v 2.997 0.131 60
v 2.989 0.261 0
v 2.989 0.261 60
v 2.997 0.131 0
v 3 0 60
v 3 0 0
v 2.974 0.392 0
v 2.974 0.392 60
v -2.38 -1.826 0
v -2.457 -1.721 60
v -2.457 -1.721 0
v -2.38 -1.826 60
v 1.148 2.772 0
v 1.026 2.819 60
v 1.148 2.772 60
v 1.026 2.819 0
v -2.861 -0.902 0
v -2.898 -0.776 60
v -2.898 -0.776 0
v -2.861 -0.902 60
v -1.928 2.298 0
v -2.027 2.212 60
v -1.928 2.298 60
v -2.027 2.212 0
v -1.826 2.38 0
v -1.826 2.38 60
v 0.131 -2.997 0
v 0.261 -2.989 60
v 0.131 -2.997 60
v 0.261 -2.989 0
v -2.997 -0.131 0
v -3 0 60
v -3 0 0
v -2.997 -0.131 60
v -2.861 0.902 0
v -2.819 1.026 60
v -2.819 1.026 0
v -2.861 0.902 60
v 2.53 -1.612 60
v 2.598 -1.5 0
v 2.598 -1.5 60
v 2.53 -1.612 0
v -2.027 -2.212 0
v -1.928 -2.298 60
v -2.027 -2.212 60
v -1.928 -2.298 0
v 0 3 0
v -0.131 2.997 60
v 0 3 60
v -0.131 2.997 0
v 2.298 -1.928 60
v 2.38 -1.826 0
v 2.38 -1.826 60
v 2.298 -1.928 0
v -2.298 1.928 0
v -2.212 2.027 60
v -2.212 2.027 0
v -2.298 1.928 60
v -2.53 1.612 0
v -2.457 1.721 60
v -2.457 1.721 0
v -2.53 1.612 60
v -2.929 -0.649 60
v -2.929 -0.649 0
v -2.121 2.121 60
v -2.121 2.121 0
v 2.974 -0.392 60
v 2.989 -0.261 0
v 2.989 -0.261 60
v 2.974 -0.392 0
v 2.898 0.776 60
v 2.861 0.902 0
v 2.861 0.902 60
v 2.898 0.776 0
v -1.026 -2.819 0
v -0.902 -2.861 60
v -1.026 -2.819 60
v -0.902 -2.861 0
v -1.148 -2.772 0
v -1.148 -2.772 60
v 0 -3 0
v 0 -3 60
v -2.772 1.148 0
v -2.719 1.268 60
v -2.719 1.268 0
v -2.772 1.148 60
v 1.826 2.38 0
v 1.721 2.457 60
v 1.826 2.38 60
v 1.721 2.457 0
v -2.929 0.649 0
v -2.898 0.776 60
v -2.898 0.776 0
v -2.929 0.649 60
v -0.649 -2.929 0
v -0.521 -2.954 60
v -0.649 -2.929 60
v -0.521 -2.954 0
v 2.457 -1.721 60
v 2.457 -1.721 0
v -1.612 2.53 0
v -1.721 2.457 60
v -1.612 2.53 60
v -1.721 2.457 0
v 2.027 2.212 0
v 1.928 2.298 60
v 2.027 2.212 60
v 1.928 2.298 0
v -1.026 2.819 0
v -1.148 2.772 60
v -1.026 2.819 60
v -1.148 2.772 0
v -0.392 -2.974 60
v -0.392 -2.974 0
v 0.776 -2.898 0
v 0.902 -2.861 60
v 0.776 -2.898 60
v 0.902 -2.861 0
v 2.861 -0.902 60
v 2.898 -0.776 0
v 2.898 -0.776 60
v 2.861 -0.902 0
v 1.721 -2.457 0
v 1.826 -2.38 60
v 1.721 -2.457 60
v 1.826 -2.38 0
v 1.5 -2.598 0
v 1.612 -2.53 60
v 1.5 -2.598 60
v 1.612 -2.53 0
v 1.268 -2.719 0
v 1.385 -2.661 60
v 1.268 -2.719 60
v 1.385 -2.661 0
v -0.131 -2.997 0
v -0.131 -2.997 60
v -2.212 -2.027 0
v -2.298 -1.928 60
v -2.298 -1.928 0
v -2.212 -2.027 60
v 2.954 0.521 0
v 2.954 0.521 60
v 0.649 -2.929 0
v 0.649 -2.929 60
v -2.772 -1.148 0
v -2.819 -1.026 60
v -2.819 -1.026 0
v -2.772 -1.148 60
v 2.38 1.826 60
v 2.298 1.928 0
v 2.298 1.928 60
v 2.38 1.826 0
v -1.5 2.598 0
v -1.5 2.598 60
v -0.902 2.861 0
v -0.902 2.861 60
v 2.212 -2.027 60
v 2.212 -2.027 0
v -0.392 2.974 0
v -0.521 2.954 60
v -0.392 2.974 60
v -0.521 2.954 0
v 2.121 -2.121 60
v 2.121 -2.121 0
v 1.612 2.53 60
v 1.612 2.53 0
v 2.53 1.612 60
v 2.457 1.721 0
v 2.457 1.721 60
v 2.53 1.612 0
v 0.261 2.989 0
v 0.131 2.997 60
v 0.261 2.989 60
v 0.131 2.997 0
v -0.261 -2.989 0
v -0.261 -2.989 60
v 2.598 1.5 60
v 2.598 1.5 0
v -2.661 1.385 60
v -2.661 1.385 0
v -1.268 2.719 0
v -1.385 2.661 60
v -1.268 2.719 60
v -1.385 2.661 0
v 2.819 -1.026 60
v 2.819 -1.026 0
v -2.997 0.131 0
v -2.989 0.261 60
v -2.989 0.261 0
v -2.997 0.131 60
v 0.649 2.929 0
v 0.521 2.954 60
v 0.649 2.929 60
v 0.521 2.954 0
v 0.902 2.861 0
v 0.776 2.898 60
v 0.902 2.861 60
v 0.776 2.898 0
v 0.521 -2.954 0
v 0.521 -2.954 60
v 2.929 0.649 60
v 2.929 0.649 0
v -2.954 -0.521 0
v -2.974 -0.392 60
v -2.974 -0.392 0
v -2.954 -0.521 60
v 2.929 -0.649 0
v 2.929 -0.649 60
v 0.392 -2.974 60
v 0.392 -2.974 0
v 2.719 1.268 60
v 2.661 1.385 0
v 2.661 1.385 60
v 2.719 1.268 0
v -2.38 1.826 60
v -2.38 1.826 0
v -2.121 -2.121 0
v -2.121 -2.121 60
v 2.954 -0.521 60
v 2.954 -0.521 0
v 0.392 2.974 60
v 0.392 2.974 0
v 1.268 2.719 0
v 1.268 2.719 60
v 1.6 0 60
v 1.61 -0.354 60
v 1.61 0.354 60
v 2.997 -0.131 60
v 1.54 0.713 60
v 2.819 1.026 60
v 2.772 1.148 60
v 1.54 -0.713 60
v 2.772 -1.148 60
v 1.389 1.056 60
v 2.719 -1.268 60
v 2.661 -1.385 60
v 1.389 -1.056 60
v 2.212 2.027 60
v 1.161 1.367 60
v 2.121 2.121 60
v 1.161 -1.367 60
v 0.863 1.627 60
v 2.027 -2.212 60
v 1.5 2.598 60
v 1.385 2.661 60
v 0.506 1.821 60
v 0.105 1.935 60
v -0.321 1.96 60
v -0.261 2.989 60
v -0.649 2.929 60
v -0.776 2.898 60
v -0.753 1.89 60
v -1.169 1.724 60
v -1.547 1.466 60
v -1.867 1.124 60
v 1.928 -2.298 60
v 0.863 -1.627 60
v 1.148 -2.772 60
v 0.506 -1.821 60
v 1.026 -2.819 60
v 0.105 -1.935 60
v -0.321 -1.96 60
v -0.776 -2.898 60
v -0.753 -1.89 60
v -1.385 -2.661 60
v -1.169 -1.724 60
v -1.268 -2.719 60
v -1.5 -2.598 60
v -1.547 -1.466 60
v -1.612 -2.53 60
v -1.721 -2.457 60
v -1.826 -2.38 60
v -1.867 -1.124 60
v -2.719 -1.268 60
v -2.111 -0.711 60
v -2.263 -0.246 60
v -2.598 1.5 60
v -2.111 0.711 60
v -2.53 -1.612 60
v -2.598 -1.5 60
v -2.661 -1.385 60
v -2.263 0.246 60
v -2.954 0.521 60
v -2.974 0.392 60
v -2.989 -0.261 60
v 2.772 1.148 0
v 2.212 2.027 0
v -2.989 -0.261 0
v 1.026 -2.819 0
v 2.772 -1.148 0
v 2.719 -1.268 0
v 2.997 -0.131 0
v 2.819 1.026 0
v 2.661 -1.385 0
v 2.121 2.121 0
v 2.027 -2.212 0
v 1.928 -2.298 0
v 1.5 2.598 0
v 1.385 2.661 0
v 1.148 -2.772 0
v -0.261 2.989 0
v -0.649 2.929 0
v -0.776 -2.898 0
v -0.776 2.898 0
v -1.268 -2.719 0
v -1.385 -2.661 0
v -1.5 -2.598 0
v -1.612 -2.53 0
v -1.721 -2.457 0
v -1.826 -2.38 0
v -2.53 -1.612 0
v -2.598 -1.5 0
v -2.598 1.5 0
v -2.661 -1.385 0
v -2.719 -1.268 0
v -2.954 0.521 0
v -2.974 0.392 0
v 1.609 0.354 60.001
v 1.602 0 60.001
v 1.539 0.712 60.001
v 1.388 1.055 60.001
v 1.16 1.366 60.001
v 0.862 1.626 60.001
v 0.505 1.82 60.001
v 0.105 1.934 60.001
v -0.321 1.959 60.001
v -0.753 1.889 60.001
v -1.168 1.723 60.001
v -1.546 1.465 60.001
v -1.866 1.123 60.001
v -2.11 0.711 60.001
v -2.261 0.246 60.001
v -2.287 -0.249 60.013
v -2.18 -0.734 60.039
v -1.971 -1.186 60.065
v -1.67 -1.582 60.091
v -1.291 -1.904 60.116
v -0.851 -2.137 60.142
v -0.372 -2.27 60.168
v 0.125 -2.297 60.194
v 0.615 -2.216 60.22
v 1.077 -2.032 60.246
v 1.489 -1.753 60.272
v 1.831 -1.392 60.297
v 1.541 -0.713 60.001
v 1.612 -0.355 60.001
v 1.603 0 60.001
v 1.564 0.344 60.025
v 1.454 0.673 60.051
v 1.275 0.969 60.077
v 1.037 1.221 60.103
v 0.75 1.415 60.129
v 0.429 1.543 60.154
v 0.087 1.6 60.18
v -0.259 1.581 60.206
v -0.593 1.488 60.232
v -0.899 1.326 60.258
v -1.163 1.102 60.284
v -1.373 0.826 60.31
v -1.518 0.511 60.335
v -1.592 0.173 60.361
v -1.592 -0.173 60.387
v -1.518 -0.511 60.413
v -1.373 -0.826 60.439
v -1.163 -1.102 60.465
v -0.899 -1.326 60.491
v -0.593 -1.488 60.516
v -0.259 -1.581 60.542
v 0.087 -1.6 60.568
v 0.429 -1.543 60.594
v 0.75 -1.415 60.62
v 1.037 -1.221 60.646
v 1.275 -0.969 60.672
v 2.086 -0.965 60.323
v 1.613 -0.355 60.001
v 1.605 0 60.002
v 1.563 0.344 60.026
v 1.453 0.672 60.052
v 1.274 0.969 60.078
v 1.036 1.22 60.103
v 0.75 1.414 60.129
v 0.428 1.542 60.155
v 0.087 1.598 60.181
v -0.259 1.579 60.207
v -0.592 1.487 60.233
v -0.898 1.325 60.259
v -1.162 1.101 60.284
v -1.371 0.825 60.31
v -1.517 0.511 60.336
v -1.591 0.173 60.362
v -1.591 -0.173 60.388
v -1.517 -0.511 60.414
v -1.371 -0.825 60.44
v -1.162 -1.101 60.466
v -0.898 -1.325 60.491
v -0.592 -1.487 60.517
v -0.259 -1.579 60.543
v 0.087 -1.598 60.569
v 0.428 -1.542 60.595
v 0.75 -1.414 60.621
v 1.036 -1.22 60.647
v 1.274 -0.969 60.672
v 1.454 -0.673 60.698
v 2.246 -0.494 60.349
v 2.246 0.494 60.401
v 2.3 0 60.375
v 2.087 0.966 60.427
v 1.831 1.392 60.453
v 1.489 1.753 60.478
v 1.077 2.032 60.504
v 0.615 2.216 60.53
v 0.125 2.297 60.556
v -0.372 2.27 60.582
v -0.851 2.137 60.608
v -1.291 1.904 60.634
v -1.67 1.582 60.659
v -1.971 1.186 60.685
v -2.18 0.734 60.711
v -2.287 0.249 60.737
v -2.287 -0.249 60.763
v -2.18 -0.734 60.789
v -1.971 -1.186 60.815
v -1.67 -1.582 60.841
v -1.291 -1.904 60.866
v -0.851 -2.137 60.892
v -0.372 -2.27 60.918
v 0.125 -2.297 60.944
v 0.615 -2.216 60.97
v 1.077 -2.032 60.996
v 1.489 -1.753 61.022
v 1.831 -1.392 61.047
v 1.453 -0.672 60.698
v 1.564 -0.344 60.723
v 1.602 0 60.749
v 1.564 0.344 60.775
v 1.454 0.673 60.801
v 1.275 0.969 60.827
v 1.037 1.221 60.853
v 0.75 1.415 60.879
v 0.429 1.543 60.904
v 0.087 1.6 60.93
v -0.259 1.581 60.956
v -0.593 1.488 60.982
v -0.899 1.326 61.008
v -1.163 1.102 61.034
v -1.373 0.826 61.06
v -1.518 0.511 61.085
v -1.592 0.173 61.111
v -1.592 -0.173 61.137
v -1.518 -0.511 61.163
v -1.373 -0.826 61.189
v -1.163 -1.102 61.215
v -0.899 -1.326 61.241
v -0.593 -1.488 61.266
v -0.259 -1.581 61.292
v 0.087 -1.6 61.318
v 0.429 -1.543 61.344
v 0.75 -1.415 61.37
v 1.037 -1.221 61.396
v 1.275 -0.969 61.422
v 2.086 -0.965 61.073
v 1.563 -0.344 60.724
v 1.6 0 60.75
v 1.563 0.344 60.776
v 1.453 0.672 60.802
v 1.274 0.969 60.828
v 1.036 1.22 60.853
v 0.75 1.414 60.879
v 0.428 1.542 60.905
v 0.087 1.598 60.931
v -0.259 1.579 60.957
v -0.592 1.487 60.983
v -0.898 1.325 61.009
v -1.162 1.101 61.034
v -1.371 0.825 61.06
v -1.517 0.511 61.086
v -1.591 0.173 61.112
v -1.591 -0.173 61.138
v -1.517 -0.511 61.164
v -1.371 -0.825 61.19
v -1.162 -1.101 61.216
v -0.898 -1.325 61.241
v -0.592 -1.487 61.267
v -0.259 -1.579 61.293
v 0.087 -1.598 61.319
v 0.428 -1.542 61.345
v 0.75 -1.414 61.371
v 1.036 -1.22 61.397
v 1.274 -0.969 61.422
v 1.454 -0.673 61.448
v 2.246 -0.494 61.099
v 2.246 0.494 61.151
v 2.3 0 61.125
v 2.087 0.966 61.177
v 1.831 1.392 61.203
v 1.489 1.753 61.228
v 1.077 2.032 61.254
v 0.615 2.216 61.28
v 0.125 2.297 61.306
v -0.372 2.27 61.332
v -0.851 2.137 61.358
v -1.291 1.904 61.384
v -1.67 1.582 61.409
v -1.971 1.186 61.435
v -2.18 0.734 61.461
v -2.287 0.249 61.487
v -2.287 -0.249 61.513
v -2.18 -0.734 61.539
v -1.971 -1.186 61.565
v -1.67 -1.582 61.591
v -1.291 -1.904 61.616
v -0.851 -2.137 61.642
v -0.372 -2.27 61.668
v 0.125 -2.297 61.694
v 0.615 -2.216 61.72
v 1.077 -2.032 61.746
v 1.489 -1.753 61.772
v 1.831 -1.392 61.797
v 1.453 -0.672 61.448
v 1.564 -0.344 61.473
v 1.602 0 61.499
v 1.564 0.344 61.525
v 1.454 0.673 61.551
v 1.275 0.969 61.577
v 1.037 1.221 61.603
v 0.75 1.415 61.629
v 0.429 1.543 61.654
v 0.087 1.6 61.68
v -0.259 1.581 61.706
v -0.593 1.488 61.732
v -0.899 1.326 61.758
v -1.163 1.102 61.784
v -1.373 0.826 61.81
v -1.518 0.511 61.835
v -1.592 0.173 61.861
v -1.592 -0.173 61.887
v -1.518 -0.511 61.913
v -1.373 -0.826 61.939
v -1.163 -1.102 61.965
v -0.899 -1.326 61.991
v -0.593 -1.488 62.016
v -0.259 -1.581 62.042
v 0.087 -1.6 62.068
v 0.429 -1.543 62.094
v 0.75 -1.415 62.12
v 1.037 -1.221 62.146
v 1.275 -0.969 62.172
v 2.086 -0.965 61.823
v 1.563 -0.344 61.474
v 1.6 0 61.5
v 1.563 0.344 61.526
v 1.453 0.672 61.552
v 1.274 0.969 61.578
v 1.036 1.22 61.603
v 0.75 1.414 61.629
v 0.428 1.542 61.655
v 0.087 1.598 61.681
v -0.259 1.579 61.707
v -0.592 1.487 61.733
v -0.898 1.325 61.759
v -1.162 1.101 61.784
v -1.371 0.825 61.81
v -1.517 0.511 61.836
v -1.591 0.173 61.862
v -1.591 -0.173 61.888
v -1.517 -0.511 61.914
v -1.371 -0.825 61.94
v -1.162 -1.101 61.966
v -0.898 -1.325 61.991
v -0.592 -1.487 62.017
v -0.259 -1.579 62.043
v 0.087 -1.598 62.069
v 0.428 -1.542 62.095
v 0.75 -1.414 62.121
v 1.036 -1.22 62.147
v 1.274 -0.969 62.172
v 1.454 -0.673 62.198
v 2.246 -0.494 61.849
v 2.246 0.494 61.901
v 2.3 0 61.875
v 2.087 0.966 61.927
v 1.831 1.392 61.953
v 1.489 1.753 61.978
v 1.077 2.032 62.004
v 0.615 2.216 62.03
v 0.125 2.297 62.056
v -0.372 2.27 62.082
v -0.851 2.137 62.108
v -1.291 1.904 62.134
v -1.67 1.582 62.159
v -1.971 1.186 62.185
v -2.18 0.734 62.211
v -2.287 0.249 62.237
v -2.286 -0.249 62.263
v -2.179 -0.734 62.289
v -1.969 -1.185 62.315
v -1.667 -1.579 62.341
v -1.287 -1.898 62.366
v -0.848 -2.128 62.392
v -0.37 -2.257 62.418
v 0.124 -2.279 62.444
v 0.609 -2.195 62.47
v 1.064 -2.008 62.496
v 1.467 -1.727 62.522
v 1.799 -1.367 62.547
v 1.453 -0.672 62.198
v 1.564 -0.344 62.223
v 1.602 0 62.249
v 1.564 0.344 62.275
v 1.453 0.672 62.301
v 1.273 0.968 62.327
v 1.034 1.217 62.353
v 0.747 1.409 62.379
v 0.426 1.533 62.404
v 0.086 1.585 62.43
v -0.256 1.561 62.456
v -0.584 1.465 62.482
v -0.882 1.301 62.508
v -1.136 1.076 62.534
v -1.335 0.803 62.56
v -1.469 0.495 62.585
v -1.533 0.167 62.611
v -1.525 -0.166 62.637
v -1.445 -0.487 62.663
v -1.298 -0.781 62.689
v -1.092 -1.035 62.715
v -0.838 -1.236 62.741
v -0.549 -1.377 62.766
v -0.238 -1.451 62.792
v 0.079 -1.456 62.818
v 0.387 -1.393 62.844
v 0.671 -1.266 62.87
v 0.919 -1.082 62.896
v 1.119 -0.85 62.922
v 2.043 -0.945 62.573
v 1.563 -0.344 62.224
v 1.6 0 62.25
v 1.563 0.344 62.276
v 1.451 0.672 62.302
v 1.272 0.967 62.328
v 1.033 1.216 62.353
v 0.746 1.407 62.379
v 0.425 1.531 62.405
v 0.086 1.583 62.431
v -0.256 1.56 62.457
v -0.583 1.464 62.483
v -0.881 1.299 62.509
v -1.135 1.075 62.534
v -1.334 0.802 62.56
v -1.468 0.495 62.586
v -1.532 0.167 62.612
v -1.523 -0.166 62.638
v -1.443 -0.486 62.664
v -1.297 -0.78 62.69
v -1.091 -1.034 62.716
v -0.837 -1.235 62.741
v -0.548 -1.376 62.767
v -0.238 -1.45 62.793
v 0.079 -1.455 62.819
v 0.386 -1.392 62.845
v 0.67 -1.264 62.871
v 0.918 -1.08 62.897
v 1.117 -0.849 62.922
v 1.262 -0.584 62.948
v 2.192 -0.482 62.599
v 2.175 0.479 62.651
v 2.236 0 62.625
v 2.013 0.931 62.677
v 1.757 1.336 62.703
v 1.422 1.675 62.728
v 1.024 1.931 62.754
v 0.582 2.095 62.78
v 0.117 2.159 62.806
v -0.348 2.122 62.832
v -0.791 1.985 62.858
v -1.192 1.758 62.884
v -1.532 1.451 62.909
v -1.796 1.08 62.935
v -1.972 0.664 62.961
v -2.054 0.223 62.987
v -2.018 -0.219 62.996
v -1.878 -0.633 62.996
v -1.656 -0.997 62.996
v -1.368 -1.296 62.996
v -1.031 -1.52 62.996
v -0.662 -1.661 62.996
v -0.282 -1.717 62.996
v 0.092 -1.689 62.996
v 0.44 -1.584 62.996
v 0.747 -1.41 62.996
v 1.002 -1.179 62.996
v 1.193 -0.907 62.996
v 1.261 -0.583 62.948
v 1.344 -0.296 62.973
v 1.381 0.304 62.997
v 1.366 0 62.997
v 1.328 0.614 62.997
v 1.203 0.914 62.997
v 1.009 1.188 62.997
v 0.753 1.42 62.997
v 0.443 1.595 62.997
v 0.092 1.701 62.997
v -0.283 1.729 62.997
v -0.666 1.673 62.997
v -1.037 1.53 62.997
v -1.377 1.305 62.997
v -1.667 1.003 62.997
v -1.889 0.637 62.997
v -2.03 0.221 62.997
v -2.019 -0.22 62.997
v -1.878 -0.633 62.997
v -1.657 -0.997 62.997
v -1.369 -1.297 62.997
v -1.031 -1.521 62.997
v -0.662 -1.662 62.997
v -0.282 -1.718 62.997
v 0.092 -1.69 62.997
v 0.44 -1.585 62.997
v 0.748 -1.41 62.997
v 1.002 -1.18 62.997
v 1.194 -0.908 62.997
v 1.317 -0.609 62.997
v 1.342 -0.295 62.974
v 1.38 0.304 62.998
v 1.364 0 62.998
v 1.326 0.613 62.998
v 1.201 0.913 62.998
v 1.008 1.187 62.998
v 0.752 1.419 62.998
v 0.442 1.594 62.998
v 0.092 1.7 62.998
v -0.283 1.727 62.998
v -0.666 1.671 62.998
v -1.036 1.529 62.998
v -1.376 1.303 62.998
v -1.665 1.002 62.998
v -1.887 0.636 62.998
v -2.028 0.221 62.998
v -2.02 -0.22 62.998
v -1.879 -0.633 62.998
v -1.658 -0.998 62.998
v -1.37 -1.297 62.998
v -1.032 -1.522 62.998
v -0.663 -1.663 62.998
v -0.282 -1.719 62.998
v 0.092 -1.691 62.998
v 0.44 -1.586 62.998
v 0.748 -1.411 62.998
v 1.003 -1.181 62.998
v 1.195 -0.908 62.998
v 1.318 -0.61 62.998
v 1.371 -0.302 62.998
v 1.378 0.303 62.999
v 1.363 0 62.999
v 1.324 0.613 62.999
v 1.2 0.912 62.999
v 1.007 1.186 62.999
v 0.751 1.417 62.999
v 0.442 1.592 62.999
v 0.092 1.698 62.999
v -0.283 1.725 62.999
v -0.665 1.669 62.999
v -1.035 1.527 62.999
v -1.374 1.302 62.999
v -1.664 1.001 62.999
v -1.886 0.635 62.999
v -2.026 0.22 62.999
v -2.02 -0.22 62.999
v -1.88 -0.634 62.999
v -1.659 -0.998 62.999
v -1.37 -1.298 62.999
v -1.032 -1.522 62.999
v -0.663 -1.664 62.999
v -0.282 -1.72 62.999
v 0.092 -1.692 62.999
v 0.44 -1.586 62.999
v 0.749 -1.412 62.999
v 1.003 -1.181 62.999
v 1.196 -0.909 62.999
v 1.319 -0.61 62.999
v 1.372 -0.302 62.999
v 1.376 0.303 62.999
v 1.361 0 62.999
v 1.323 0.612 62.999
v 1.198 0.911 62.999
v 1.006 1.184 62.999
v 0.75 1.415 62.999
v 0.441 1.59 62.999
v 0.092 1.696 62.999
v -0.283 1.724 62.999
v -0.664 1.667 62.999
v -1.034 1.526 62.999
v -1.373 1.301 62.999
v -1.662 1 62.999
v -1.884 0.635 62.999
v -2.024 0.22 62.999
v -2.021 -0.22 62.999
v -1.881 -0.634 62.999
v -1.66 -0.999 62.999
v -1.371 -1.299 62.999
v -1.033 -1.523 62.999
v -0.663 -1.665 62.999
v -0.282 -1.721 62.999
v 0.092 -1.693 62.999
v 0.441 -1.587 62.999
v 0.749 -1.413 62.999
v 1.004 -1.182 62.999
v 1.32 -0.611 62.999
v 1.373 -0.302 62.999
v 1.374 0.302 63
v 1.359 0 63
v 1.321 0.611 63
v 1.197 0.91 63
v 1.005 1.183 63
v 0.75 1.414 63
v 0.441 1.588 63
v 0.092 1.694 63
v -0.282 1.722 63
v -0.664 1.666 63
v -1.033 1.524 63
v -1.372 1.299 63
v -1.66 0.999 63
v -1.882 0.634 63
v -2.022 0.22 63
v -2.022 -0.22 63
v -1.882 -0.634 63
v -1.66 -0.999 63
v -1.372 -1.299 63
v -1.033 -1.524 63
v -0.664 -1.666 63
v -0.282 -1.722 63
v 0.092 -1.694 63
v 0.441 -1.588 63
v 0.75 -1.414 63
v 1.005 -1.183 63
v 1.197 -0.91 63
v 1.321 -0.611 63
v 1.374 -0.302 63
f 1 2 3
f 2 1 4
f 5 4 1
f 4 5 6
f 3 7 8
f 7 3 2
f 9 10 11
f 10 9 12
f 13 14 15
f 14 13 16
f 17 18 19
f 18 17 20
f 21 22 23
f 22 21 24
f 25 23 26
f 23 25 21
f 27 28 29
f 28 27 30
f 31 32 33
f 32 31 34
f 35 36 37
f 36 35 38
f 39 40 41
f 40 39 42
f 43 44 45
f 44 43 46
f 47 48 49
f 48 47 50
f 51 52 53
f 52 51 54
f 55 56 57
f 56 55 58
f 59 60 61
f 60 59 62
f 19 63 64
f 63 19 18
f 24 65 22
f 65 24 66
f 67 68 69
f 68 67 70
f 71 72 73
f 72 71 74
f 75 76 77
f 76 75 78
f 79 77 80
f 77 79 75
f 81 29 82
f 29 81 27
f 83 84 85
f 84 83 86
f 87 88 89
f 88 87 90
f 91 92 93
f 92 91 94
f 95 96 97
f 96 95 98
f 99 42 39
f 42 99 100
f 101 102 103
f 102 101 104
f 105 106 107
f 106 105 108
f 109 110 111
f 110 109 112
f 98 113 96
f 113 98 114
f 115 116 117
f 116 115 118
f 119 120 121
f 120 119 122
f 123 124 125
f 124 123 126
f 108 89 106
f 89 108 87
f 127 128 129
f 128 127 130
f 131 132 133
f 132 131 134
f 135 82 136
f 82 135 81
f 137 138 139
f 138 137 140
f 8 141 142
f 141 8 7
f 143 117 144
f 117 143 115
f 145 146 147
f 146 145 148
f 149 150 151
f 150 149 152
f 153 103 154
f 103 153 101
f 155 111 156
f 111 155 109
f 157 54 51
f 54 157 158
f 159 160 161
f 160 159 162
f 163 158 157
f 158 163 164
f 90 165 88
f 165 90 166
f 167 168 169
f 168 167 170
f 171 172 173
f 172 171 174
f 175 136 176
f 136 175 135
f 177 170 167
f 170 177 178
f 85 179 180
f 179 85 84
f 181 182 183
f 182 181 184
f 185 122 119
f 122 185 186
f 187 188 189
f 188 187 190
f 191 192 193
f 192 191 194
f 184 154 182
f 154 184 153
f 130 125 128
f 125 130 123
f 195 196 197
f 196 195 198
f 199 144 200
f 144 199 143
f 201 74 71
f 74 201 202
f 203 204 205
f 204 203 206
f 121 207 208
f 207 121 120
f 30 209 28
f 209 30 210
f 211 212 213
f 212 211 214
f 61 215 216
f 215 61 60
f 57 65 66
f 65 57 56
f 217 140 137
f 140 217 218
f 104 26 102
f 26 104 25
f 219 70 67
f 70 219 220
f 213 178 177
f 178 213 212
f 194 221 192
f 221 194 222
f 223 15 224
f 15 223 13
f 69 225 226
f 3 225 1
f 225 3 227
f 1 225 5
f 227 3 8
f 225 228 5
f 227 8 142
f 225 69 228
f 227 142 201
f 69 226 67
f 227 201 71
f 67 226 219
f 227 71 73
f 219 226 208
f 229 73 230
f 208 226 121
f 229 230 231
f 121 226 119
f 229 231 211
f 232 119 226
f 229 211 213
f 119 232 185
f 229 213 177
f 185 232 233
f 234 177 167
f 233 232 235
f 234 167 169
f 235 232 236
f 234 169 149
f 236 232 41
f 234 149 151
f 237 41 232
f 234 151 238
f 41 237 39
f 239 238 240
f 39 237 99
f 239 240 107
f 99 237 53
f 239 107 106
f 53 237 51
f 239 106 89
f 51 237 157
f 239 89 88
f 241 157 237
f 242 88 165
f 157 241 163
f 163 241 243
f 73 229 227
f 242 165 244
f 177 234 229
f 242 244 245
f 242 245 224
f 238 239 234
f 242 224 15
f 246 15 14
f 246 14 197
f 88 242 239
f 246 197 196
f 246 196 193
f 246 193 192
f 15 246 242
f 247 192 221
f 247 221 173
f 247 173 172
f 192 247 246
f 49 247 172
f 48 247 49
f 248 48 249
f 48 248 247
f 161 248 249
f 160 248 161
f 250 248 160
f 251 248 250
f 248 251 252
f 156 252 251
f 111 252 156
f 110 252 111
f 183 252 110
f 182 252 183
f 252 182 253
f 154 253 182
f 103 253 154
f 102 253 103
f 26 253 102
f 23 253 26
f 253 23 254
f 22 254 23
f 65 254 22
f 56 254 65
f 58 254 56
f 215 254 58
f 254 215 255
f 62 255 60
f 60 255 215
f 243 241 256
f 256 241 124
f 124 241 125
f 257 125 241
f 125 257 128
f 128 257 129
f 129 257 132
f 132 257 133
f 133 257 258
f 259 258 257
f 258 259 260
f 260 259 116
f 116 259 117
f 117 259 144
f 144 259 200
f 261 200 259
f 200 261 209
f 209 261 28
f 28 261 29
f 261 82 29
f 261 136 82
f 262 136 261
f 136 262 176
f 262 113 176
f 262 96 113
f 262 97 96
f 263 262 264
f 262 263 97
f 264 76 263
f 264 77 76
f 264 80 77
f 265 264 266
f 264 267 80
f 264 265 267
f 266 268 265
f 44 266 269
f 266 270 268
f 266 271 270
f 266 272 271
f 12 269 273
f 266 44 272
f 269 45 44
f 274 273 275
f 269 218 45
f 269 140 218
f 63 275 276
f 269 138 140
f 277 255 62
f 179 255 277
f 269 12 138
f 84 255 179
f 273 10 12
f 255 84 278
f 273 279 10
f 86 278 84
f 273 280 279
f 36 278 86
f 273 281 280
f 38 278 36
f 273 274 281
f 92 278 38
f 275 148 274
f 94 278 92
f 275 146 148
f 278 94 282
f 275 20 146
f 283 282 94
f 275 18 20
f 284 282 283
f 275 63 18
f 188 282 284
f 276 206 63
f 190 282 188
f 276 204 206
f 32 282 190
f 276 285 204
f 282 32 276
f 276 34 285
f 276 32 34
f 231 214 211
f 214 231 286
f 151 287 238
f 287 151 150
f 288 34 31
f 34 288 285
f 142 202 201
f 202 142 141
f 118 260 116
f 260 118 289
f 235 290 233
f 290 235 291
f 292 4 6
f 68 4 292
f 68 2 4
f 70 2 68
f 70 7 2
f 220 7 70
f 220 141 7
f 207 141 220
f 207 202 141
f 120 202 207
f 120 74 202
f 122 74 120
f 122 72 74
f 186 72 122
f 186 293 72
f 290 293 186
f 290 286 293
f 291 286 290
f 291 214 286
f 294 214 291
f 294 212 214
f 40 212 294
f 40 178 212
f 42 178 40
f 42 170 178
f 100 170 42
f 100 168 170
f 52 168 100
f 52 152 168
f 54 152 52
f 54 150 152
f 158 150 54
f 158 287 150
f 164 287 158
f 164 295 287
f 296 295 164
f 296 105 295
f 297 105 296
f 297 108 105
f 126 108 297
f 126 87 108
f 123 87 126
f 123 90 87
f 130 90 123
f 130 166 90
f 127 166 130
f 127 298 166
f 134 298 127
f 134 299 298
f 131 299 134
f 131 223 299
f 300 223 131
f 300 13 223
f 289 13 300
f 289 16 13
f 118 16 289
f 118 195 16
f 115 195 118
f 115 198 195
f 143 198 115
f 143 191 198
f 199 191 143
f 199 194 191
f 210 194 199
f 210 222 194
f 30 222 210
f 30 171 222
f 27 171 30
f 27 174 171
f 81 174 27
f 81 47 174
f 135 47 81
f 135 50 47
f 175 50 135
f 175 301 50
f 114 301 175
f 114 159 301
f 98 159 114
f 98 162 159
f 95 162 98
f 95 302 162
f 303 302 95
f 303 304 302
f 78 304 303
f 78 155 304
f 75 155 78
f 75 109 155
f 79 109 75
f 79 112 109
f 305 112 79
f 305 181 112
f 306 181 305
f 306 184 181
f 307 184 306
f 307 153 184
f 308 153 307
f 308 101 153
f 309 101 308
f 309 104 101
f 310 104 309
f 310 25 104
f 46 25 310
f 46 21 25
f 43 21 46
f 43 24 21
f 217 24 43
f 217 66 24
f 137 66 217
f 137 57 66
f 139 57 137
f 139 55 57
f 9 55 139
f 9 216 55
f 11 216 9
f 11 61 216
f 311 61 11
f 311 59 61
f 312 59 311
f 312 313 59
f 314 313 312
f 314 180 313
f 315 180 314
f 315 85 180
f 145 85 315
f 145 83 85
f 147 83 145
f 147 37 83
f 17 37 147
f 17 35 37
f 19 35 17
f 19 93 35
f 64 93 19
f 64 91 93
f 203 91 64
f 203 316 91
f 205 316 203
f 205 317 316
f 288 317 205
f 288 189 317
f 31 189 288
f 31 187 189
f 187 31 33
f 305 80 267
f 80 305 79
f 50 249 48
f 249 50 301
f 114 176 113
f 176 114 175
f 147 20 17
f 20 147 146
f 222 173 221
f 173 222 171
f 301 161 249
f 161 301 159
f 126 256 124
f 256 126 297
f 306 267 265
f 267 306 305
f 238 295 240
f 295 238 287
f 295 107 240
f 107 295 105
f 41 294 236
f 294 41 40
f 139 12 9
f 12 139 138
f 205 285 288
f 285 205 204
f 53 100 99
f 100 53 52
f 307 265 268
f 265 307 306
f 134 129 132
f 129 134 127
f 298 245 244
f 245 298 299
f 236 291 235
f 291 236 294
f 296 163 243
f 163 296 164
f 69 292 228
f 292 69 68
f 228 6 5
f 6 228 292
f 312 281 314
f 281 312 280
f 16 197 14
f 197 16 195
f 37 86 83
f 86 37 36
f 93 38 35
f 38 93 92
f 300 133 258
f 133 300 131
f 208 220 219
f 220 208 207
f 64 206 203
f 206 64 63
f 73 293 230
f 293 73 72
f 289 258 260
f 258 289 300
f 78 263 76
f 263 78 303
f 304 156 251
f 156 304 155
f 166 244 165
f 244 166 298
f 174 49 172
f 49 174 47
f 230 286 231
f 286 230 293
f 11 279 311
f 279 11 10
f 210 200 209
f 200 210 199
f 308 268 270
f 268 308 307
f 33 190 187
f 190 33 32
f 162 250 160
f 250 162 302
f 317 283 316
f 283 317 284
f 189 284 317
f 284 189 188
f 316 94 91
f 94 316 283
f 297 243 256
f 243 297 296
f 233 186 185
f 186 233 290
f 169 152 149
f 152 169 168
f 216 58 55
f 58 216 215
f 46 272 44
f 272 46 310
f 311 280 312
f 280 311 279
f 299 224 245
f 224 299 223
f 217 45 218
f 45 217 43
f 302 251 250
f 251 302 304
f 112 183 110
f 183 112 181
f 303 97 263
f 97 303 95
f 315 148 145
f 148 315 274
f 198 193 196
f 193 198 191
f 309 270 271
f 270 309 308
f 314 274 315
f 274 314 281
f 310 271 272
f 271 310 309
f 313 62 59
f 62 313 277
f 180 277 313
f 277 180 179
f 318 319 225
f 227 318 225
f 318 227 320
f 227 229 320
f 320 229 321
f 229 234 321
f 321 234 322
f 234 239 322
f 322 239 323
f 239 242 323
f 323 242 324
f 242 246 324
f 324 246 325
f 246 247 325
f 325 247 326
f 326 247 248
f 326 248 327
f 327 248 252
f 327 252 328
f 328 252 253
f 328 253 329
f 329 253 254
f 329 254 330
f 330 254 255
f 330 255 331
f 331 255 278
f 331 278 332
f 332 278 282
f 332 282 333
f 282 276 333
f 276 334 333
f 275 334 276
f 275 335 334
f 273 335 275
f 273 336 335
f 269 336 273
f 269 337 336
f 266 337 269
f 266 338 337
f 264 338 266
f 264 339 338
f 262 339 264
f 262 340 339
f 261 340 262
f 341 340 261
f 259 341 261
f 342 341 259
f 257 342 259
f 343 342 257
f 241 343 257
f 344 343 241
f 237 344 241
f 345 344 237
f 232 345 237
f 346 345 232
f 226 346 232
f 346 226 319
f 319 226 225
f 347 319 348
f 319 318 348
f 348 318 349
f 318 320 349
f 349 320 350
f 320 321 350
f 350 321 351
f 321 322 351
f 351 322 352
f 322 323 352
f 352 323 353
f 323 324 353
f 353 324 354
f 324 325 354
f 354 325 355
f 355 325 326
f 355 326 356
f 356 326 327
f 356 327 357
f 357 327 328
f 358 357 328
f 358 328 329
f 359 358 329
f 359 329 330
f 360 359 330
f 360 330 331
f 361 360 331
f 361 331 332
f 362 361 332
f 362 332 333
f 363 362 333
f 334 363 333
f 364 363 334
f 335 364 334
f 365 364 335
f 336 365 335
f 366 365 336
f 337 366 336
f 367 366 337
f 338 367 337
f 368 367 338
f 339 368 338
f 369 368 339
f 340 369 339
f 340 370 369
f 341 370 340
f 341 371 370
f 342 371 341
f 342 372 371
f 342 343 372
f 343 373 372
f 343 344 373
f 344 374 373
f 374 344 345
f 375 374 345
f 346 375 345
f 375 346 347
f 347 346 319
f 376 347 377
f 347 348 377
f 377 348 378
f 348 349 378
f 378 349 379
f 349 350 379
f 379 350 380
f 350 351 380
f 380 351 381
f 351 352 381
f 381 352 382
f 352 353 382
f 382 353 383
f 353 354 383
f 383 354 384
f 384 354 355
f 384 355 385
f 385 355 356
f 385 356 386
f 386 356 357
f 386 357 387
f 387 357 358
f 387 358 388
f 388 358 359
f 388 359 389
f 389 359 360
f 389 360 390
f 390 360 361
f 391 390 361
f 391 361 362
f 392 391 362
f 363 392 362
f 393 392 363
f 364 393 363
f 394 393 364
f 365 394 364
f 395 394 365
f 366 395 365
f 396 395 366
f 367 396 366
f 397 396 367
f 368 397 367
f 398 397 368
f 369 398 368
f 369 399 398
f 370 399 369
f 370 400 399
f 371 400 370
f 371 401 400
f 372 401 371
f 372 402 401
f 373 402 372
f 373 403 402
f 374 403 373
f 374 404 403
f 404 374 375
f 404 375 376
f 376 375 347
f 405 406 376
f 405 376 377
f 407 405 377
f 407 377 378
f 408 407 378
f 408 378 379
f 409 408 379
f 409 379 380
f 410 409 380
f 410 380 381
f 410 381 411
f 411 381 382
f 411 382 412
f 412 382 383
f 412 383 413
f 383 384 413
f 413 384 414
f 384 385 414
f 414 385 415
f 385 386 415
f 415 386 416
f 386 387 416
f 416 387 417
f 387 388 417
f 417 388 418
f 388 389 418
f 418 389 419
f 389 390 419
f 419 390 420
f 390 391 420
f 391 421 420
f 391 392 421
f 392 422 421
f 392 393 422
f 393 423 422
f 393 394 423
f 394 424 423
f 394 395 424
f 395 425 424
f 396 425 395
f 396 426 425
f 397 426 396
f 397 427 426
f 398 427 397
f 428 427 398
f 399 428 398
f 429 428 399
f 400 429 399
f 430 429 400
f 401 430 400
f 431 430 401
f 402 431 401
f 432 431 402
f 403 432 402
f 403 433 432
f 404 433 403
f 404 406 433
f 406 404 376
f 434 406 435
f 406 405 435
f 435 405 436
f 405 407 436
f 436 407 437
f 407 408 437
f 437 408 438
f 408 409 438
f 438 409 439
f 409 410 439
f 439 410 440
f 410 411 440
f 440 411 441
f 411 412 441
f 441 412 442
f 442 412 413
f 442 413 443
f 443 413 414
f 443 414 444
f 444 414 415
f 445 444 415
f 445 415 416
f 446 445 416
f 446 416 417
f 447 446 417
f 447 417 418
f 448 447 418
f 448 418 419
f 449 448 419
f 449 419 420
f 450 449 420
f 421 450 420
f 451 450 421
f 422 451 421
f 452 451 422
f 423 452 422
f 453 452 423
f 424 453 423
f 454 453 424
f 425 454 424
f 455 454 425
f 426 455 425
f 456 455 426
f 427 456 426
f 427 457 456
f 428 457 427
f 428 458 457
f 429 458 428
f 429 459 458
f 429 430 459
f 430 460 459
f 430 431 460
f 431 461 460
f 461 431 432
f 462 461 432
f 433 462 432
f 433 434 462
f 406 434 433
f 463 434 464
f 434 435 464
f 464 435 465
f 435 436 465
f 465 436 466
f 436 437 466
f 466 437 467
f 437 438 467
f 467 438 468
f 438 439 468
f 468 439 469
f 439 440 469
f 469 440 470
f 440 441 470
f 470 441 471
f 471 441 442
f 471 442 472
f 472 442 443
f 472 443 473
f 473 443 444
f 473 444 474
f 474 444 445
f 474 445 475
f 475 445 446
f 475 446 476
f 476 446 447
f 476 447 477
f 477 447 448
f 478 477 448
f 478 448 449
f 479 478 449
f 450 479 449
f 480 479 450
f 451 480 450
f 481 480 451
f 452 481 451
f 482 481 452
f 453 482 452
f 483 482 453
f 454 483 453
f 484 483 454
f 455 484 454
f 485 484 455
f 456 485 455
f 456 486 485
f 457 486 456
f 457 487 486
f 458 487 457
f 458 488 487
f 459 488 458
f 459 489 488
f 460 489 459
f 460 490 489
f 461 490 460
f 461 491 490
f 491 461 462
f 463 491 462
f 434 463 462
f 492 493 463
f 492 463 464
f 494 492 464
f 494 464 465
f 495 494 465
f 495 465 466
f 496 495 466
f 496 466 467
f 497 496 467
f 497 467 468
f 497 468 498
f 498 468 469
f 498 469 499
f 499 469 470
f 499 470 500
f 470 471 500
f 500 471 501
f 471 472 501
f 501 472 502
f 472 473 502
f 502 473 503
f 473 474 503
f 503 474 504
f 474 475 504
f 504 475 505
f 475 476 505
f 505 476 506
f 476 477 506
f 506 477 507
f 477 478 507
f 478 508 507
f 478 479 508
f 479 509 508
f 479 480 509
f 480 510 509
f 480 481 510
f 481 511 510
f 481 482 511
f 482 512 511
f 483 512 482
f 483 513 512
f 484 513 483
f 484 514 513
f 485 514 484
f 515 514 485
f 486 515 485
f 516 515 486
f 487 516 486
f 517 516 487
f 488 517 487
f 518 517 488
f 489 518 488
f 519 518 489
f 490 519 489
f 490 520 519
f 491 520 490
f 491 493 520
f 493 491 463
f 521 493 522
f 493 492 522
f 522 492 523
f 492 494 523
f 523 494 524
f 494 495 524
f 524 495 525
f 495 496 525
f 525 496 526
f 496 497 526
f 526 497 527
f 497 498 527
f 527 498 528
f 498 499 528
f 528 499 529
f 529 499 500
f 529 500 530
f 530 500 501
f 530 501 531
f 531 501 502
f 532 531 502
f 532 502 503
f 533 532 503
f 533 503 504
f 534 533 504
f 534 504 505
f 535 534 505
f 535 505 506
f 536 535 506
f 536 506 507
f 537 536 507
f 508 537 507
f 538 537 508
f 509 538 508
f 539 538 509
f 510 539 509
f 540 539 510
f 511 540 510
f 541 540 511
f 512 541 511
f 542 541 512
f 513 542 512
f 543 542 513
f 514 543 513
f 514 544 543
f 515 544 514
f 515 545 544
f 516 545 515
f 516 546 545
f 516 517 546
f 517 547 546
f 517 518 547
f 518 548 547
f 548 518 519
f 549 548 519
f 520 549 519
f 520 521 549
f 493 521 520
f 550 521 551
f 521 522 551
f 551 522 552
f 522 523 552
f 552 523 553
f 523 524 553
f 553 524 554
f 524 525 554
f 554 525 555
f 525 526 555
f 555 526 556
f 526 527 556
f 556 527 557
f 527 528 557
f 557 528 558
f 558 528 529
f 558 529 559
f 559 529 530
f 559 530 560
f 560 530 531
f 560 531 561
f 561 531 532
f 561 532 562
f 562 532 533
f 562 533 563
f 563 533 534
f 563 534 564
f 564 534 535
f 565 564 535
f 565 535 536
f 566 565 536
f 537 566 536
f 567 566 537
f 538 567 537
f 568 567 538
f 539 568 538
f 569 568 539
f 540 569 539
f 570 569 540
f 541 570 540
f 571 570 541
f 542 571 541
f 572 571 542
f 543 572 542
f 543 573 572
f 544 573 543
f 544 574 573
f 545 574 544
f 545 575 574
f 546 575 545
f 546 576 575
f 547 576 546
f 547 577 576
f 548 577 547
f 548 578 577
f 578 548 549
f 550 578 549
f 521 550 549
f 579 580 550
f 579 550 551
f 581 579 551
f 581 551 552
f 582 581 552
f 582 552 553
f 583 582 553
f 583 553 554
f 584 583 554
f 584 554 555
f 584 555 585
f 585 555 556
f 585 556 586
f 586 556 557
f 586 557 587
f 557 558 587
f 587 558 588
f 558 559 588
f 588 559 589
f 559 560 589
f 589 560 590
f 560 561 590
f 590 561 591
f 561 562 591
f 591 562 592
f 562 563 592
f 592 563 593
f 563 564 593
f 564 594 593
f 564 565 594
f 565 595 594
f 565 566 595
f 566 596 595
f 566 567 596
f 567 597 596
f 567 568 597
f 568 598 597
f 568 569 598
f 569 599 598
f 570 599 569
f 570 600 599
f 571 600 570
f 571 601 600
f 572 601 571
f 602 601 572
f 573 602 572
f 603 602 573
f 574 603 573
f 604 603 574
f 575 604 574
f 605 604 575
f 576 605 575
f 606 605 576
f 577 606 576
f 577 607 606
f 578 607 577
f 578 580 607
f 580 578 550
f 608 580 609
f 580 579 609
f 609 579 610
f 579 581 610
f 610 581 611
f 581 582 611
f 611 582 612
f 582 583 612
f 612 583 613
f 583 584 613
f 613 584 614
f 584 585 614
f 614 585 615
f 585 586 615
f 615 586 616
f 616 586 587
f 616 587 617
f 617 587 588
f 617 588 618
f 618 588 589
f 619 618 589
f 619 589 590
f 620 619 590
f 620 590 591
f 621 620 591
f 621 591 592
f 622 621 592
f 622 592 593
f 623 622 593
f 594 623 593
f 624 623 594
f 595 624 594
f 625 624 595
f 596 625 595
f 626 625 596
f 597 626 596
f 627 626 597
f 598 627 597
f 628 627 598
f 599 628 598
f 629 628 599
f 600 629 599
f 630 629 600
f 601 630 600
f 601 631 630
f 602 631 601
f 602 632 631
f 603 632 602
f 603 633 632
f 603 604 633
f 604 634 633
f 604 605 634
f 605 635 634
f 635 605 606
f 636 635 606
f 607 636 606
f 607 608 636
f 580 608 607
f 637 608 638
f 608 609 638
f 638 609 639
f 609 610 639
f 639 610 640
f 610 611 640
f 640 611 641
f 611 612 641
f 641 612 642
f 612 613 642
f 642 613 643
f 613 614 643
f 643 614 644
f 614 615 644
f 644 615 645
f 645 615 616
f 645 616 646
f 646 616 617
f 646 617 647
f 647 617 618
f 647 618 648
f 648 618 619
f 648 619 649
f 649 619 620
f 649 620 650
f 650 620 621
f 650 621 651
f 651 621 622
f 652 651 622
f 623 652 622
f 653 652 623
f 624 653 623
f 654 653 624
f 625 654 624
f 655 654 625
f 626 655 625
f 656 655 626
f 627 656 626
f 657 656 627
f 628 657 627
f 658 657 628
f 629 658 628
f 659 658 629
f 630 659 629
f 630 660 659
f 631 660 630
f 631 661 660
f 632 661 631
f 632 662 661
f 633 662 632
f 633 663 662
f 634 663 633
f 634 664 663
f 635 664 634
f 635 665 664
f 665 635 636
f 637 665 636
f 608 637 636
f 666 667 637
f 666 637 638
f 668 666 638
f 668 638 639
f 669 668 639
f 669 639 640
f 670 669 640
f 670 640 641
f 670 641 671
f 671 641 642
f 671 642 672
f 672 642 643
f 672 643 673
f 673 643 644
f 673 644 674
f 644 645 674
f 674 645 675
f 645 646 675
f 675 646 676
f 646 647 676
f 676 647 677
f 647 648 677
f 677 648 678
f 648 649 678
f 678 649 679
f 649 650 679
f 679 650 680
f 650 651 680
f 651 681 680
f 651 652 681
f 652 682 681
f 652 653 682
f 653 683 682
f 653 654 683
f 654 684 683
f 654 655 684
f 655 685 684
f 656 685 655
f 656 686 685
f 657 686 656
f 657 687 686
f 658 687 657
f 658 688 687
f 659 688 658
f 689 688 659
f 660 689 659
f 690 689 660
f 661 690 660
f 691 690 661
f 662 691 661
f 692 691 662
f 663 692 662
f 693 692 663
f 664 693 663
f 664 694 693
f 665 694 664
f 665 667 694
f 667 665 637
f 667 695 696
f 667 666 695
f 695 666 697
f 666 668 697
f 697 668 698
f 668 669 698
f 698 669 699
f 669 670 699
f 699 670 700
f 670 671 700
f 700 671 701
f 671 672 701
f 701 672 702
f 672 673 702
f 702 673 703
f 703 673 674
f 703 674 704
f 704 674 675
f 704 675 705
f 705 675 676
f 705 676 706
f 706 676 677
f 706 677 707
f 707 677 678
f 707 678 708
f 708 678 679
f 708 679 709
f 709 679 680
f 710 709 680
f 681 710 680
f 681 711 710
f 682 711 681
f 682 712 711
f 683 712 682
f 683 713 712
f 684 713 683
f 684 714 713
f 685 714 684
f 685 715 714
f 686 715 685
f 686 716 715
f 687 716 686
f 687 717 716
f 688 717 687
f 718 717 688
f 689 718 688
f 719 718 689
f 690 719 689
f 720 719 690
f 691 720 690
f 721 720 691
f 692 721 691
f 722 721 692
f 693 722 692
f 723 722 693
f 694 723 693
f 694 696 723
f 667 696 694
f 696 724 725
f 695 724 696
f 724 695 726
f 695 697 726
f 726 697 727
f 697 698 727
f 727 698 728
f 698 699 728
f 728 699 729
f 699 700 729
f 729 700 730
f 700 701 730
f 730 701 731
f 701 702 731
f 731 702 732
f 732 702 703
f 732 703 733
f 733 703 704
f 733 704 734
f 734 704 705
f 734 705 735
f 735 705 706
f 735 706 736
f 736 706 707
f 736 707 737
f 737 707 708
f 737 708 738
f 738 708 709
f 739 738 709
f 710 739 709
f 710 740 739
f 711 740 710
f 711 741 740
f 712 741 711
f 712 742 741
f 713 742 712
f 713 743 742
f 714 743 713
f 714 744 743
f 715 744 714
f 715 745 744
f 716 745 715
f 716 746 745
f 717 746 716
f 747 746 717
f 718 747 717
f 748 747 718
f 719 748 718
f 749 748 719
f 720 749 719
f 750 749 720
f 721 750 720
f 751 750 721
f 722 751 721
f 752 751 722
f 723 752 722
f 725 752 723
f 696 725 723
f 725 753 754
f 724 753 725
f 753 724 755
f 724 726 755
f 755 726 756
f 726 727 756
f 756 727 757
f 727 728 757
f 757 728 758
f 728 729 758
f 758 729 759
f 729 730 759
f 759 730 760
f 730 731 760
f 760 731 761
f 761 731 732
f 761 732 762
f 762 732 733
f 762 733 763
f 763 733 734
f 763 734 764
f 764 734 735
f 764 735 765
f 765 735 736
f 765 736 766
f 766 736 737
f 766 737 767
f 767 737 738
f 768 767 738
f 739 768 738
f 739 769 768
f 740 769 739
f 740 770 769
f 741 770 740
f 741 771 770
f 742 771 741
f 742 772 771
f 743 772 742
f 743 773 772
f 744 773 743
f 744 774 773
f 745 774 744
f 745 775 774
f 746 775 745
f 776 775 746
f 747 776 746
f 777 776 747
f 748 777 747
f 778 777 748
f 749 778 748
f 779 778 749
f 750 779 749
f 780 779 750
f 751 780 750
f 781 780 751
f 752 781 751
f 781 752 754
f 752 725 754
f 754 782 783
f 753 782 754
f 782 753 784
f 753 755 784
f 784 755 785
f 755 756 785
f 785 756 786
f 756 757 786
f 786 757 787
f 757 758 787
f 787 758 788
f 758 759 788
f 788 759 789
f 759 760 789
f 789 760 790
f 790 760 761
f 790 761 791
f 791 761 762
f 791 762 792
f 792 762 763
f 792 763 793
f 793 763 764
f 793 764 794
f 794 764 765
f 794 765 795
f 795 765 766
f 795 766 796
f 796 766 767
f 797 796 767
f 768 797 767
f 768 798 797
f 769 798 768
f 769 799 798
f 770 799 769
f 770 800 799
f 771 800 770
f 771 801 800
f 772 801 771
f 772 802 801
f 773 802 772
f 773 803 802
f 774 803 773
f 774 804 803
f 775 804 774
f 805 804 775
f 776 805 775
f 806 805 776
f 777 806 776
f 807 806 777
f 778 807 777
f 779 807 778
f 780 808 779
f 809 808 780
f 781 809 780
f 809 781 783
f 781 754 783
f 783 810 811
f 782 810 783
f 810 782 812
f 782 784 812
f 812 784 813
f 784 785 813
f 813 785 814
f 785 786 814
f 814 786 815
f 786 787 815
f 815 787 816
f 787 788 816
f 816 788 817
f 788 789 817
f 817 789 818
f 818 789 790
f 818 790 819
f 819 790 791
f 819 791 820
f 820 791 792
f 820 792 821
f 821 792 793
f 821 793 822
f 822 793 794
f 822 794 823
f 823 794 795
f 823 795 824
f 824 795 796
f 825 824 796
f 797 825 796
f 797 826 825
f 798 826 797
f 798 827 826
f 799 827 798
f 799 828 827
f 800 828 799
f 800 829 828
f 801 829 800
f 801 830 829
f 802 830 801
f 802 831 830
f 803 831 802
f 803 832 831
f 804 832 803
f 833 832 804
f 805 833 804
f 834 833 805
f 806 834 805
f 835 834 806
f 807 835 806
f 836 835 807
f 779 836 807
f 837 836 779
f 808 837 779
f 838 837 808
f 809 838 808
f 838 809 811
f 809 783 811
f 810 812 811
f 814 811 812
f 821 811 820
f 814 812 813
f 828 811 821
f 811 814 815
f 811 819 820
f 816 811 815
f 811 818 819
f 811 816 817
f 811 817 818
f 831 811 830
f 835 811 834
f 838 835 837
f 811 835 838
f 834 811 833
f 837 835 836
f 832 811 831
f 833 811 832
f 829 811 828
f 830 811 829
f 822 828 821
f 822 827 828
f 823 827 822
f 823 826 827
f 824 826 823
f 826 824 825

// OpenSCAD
// Created 2016-2017 by Ryan A. Colyer.
// This work is released with CC0 into the public domain.
// https://creativecommons.org/publicdomain/zero/1.0/
//
// https://www.thingiverse.com/thing:1686322
//
// v2.1

$fn = 100;

screw_resolution = 0.5;  // in mm

// Legs
leg_diameter = 6;
leg_height = 60;

// Provides standard metric thread pitches.
function ThreadPitch(diameter) =
  (diameter <= 64) ?
    lookup(diameter, [
      [2, 0.4],
      [2.5, 0.45],
      [3, 0.5],
      [4, 0.7],
      [5, 0.8],
      [6, 1.0],
      [7, 1.0],
      [8, 1.25],
      [10, 1.5],
      [12, 1.75],
      [14, 2.0],
      [16, 2.0],
      [18, 2.5],
      [20, 2.5],
      [22, 2.5],
      [24, 3.0],
      [27, 3.0],
      [30, 3.5],
      [33, 3.5],
      [36, 4.0],
      [39, 4.0],
      [42, 4.5],
      [48, 5.0],
      [52, 5.0],
      [56, 5.5],
      [60, 5.5],
      [64, 6.0]
    ]) :
    diameter * 6.0 / 64;


// This generates a closed polyhedron from an array of arrays of points,
// with each inner array tracing out one loop outlining the polyhedron.
// pointarrays should contain an array of N arrays each of size P outlining a
// closed manifold.  The points must obey the right-hand rule.  For example,
// looking down, the P points in the inner arrays are counter-clockwise in a
// loop, while the N point arrays increase in height.  Points in each inner
// array do not need to be equal height, but they usually should not meet or
// cross the line segments from the adjacent points in the other arrays.
// (N>=2, P>=3)
// Core triangles:
//   [j][i], [j+1][i], [j+1][(i+1)%P]
//   [j][i], [j+1][(i+1)%P], [j][(i+1)%P]
//   Then triangles are formed in a loop with the middle point of the first
//   and last array.
module ClosePoints(pointarrays) {
  function recurse_avg(arr, n=0, p=[0,0,0]) = (n>=len(arr)) ? p :
    recurse_avg(arr, n+1, p+(arr[n]-p)/(n+1));

  N = len(pointarrays);
  P = len(pointarrays[0]);
  NP = N*P;
  lastarr = pointarrays[N-1];
  midbot = recurse_avg(pointarrays[0]);
  midtop = recurse_avg(pointarrays[N-1]);

  faces_bot = [
    for (i=[0:P-1])
      [0,i+1,1+(i+1)%len(pointarrays[0])]
  ];

  loop_offset = 1;
  bot_len = loop_offset + P;

  faces_loop = [
    for (j=[0:N-2], i=[0:P-1], t=[0:1])
      [loop_offset, loop_offset, loop_offset] + (t==0 ?
      [j*P+i, (j+1)*P+i, (j+1)*P+(i+1)%P] :
      [j*P+i, (j+1)*P+(i+1)%P, j*P+(i+1)%P])
  ];

  top_offset = loop_offset + NP - P;
  midtop_offset = top_offset + P;

  faces_top = [
    for (i=[0:P-1])
      [midtop_offset,top_offset+(i+1)%P,top_offset+i]
  ];

  points = [
    for (i=[-1:NP])
      (i<0) ? midbot :
      ((i==NP) ? midtop :
      pointarrays[floor(i/P)][i%P])
  ];
  faces = concat(faces_bot, faces_loop, faces_top);

  polyhedron(points=points, faces=faces);
}

// This creates a vertical rod at the origin with external threads.  It uses
// metric standards by default.
module ScrewThread(outer_diam, height, pitch=0, tooth_angle=30, tolerance=0.4, tip_height=0, tooth_height=0, tip_min_fract=0) {

  pitch = (pitch==0) ? ThreadPitch(outer_diam) : pitch;
  tooth_height = (tooth_height==0) ? pitch : tooth_height;
  tip_min_fract = (tip_min_fract<0) ? 0 :
    ((tip_min_fract>0.9999) ? 0.9999 : tip_min_fract);

  outer_diam_cor = outer_diam + 0.25*tolerance; // Plastic shrinkage correction
  inner_diam = outer_diam - tooth_height/tan(tooth_angle);
  or = (outer_diam_cor < screw_resolution) ?
    screw_resolution/2 : outer_diam_cor / 2;
  ir = (inner_diam < screw_resolution) ? screw_resolution/2 : inner_diam / 2;
  height = (height < screw_resolution) ? screw_resolution : height;

  steps_per_loop_try = ceil(2*3.14159265359*or / screw_resolution);
  steps_per_loop = (steps_per_loop_try < 4) ? 4 : steps_per_loop_try;
  hs_ext = 3;
  hsteps = ceil(3 * height / pitch) + 2*hs_ext;

  extent = or - ir;

  tip_start = height-tip_height;
  tip_height_sc = tip_height / (1-tip_min_fract);

  tip_height_ir = (tip_height_sc > tooth_height/2) ?
    tip_height_sc - tooth_height/2 : tip_height_sc;

  tip_height_w = (tip_height_sc > tooth_height) ? tooth_height : tip_height_sc;
  tip_wstart = height + tip_height_sc - tip_height - tip_height_w;


  function tooth_width(a, h, pitch, tooth_height, extent) =
    let(
      ang_full = h*360.0/pitch-a,
      ang_pn = atan2(sin(ang_full), cos(ang_full)),
      ang = ang_pn < 0 ? ang_pn+360 : ang_pn,
      frac = ang/360,
      tfrac_half = tooth_height / (2*pitch),
      tfrac_cut = 2*tfrac_half
    )
    (frac > tfrac_cut) ? 0 : (
      (frac <= tfrac_half) ?
        ((frac / tfrac_half) * extent) :
        ((1 - (frac - tfrac_half)/tfrac_half) * extent)
    );


  pointarrays = [
    for (hs=[0:hsteps])
      [
        for (s=[0:steps_per_loop-1])
          let(
            ang_full = s*360.0/steps_per_loop,
            ang_pn = atan2(sin(ang_full), cos(ang_full)),
            ang = ang_pn < 0 ? ang_pn+360 : ang_pn,

            h_fudge = pitch*0.001,

            h_mod =
              (hs%3 == 2) ?
                ((s == steps_per_loop-1) ? tooth_height - h_fudge : (
                 (s == steps_per_loop-2) ? tooth_height/2 : 0)) : (
              (hs%3 == 0) ?
                ((s == steps_per_loop-1) ? pitch-tooth_height/2 : (
                 (s == steps_per_loop-2) ? pitch-tooth_height + h_fudge : 0)) :
                ((s == steps_per_loop-1) ? pitch-tooth_height/2 + h_fudge : (
                 (s == steps_per_loop-2) ? tooth_height/2 : 0))
              ),

            h_level =
              (hs%3 == 2) ? tooth_height - h_fudge : (
              (hs%3 == 0) ? 0 : tooth_height/2),

            h_ub = floor((hs-hs_ext)/3) * pitch
              + h_level + ang*pitch/360.0 - h_mod,
            h_max = height - (hsteps-hs) * h_fudge,
            h_min = hs * h_fudge,
            h = (h_ub < h_min) ? h_min : ((h_ub > h_max) ? h_max : h_ub),

            ht = h - tip_start,
            hf_ir = ht/tip_height_ir,
            ht_w = h - tip_wstart,
            hf_w_t = ht_w/tip_height_w,
            hf_w = (hf_w_t < 0) ? 0 : ((hf_w_t > 1) ? 1 : hf_w_t),

            ext_tip = (h <= tip_wstart) ? extent : (1-hf_w) * extent,
            wnormal = tooth_width(ang, h, pitch, tooth_height, ext_tip),
            w = (h <= tip_wstart) ? wnormal :
              (1-hf_w) * wnormal +
              hf_w * (0.1*screw_resolution + (wnormal * wnormal * wnormal /
                (ext_tip*ext_tip+0.1*screw_resolution))),
            r = (ht <= 0) ? ir + w :
              ( (ht < tip_height_ir ? ((2/(1+(hf_ir*hf_ir))-1) * ir) : 0) + w)
          )
          [r*cos(ang), r*sin(ang), h]
      ]
  ];


  ClosePoints(pointarrays);
}

// Solid rod on the bottom, external threads on the top.
module RodStart(height, diameter, thread_len=0, thread_diam=0, thread_pitch=0) {
  // A reasonable default.
  thread_diam = (thread_diam==0) ? 0.75*diameter : thread_diam;
  thread_len = (thread_len==0) ? 0.5*diameter : thread_len;
  thread_pitch = (thread_pitch==0) ? ThreadPitch(thread_diam) : thread_pitch;

  cylinder(r=diameter/2, h=height, $fn=24*diameter);

  translate([0, 0, height])
    ScrewThread(thread_diam, thread_len, thread_pitch,
      tip_height=thread_pitch, tip_min_fract=0.75);
}

// Legs
module leg() {
  RodStart(leg_height, leg_diameter);
}

// Render
leg();
